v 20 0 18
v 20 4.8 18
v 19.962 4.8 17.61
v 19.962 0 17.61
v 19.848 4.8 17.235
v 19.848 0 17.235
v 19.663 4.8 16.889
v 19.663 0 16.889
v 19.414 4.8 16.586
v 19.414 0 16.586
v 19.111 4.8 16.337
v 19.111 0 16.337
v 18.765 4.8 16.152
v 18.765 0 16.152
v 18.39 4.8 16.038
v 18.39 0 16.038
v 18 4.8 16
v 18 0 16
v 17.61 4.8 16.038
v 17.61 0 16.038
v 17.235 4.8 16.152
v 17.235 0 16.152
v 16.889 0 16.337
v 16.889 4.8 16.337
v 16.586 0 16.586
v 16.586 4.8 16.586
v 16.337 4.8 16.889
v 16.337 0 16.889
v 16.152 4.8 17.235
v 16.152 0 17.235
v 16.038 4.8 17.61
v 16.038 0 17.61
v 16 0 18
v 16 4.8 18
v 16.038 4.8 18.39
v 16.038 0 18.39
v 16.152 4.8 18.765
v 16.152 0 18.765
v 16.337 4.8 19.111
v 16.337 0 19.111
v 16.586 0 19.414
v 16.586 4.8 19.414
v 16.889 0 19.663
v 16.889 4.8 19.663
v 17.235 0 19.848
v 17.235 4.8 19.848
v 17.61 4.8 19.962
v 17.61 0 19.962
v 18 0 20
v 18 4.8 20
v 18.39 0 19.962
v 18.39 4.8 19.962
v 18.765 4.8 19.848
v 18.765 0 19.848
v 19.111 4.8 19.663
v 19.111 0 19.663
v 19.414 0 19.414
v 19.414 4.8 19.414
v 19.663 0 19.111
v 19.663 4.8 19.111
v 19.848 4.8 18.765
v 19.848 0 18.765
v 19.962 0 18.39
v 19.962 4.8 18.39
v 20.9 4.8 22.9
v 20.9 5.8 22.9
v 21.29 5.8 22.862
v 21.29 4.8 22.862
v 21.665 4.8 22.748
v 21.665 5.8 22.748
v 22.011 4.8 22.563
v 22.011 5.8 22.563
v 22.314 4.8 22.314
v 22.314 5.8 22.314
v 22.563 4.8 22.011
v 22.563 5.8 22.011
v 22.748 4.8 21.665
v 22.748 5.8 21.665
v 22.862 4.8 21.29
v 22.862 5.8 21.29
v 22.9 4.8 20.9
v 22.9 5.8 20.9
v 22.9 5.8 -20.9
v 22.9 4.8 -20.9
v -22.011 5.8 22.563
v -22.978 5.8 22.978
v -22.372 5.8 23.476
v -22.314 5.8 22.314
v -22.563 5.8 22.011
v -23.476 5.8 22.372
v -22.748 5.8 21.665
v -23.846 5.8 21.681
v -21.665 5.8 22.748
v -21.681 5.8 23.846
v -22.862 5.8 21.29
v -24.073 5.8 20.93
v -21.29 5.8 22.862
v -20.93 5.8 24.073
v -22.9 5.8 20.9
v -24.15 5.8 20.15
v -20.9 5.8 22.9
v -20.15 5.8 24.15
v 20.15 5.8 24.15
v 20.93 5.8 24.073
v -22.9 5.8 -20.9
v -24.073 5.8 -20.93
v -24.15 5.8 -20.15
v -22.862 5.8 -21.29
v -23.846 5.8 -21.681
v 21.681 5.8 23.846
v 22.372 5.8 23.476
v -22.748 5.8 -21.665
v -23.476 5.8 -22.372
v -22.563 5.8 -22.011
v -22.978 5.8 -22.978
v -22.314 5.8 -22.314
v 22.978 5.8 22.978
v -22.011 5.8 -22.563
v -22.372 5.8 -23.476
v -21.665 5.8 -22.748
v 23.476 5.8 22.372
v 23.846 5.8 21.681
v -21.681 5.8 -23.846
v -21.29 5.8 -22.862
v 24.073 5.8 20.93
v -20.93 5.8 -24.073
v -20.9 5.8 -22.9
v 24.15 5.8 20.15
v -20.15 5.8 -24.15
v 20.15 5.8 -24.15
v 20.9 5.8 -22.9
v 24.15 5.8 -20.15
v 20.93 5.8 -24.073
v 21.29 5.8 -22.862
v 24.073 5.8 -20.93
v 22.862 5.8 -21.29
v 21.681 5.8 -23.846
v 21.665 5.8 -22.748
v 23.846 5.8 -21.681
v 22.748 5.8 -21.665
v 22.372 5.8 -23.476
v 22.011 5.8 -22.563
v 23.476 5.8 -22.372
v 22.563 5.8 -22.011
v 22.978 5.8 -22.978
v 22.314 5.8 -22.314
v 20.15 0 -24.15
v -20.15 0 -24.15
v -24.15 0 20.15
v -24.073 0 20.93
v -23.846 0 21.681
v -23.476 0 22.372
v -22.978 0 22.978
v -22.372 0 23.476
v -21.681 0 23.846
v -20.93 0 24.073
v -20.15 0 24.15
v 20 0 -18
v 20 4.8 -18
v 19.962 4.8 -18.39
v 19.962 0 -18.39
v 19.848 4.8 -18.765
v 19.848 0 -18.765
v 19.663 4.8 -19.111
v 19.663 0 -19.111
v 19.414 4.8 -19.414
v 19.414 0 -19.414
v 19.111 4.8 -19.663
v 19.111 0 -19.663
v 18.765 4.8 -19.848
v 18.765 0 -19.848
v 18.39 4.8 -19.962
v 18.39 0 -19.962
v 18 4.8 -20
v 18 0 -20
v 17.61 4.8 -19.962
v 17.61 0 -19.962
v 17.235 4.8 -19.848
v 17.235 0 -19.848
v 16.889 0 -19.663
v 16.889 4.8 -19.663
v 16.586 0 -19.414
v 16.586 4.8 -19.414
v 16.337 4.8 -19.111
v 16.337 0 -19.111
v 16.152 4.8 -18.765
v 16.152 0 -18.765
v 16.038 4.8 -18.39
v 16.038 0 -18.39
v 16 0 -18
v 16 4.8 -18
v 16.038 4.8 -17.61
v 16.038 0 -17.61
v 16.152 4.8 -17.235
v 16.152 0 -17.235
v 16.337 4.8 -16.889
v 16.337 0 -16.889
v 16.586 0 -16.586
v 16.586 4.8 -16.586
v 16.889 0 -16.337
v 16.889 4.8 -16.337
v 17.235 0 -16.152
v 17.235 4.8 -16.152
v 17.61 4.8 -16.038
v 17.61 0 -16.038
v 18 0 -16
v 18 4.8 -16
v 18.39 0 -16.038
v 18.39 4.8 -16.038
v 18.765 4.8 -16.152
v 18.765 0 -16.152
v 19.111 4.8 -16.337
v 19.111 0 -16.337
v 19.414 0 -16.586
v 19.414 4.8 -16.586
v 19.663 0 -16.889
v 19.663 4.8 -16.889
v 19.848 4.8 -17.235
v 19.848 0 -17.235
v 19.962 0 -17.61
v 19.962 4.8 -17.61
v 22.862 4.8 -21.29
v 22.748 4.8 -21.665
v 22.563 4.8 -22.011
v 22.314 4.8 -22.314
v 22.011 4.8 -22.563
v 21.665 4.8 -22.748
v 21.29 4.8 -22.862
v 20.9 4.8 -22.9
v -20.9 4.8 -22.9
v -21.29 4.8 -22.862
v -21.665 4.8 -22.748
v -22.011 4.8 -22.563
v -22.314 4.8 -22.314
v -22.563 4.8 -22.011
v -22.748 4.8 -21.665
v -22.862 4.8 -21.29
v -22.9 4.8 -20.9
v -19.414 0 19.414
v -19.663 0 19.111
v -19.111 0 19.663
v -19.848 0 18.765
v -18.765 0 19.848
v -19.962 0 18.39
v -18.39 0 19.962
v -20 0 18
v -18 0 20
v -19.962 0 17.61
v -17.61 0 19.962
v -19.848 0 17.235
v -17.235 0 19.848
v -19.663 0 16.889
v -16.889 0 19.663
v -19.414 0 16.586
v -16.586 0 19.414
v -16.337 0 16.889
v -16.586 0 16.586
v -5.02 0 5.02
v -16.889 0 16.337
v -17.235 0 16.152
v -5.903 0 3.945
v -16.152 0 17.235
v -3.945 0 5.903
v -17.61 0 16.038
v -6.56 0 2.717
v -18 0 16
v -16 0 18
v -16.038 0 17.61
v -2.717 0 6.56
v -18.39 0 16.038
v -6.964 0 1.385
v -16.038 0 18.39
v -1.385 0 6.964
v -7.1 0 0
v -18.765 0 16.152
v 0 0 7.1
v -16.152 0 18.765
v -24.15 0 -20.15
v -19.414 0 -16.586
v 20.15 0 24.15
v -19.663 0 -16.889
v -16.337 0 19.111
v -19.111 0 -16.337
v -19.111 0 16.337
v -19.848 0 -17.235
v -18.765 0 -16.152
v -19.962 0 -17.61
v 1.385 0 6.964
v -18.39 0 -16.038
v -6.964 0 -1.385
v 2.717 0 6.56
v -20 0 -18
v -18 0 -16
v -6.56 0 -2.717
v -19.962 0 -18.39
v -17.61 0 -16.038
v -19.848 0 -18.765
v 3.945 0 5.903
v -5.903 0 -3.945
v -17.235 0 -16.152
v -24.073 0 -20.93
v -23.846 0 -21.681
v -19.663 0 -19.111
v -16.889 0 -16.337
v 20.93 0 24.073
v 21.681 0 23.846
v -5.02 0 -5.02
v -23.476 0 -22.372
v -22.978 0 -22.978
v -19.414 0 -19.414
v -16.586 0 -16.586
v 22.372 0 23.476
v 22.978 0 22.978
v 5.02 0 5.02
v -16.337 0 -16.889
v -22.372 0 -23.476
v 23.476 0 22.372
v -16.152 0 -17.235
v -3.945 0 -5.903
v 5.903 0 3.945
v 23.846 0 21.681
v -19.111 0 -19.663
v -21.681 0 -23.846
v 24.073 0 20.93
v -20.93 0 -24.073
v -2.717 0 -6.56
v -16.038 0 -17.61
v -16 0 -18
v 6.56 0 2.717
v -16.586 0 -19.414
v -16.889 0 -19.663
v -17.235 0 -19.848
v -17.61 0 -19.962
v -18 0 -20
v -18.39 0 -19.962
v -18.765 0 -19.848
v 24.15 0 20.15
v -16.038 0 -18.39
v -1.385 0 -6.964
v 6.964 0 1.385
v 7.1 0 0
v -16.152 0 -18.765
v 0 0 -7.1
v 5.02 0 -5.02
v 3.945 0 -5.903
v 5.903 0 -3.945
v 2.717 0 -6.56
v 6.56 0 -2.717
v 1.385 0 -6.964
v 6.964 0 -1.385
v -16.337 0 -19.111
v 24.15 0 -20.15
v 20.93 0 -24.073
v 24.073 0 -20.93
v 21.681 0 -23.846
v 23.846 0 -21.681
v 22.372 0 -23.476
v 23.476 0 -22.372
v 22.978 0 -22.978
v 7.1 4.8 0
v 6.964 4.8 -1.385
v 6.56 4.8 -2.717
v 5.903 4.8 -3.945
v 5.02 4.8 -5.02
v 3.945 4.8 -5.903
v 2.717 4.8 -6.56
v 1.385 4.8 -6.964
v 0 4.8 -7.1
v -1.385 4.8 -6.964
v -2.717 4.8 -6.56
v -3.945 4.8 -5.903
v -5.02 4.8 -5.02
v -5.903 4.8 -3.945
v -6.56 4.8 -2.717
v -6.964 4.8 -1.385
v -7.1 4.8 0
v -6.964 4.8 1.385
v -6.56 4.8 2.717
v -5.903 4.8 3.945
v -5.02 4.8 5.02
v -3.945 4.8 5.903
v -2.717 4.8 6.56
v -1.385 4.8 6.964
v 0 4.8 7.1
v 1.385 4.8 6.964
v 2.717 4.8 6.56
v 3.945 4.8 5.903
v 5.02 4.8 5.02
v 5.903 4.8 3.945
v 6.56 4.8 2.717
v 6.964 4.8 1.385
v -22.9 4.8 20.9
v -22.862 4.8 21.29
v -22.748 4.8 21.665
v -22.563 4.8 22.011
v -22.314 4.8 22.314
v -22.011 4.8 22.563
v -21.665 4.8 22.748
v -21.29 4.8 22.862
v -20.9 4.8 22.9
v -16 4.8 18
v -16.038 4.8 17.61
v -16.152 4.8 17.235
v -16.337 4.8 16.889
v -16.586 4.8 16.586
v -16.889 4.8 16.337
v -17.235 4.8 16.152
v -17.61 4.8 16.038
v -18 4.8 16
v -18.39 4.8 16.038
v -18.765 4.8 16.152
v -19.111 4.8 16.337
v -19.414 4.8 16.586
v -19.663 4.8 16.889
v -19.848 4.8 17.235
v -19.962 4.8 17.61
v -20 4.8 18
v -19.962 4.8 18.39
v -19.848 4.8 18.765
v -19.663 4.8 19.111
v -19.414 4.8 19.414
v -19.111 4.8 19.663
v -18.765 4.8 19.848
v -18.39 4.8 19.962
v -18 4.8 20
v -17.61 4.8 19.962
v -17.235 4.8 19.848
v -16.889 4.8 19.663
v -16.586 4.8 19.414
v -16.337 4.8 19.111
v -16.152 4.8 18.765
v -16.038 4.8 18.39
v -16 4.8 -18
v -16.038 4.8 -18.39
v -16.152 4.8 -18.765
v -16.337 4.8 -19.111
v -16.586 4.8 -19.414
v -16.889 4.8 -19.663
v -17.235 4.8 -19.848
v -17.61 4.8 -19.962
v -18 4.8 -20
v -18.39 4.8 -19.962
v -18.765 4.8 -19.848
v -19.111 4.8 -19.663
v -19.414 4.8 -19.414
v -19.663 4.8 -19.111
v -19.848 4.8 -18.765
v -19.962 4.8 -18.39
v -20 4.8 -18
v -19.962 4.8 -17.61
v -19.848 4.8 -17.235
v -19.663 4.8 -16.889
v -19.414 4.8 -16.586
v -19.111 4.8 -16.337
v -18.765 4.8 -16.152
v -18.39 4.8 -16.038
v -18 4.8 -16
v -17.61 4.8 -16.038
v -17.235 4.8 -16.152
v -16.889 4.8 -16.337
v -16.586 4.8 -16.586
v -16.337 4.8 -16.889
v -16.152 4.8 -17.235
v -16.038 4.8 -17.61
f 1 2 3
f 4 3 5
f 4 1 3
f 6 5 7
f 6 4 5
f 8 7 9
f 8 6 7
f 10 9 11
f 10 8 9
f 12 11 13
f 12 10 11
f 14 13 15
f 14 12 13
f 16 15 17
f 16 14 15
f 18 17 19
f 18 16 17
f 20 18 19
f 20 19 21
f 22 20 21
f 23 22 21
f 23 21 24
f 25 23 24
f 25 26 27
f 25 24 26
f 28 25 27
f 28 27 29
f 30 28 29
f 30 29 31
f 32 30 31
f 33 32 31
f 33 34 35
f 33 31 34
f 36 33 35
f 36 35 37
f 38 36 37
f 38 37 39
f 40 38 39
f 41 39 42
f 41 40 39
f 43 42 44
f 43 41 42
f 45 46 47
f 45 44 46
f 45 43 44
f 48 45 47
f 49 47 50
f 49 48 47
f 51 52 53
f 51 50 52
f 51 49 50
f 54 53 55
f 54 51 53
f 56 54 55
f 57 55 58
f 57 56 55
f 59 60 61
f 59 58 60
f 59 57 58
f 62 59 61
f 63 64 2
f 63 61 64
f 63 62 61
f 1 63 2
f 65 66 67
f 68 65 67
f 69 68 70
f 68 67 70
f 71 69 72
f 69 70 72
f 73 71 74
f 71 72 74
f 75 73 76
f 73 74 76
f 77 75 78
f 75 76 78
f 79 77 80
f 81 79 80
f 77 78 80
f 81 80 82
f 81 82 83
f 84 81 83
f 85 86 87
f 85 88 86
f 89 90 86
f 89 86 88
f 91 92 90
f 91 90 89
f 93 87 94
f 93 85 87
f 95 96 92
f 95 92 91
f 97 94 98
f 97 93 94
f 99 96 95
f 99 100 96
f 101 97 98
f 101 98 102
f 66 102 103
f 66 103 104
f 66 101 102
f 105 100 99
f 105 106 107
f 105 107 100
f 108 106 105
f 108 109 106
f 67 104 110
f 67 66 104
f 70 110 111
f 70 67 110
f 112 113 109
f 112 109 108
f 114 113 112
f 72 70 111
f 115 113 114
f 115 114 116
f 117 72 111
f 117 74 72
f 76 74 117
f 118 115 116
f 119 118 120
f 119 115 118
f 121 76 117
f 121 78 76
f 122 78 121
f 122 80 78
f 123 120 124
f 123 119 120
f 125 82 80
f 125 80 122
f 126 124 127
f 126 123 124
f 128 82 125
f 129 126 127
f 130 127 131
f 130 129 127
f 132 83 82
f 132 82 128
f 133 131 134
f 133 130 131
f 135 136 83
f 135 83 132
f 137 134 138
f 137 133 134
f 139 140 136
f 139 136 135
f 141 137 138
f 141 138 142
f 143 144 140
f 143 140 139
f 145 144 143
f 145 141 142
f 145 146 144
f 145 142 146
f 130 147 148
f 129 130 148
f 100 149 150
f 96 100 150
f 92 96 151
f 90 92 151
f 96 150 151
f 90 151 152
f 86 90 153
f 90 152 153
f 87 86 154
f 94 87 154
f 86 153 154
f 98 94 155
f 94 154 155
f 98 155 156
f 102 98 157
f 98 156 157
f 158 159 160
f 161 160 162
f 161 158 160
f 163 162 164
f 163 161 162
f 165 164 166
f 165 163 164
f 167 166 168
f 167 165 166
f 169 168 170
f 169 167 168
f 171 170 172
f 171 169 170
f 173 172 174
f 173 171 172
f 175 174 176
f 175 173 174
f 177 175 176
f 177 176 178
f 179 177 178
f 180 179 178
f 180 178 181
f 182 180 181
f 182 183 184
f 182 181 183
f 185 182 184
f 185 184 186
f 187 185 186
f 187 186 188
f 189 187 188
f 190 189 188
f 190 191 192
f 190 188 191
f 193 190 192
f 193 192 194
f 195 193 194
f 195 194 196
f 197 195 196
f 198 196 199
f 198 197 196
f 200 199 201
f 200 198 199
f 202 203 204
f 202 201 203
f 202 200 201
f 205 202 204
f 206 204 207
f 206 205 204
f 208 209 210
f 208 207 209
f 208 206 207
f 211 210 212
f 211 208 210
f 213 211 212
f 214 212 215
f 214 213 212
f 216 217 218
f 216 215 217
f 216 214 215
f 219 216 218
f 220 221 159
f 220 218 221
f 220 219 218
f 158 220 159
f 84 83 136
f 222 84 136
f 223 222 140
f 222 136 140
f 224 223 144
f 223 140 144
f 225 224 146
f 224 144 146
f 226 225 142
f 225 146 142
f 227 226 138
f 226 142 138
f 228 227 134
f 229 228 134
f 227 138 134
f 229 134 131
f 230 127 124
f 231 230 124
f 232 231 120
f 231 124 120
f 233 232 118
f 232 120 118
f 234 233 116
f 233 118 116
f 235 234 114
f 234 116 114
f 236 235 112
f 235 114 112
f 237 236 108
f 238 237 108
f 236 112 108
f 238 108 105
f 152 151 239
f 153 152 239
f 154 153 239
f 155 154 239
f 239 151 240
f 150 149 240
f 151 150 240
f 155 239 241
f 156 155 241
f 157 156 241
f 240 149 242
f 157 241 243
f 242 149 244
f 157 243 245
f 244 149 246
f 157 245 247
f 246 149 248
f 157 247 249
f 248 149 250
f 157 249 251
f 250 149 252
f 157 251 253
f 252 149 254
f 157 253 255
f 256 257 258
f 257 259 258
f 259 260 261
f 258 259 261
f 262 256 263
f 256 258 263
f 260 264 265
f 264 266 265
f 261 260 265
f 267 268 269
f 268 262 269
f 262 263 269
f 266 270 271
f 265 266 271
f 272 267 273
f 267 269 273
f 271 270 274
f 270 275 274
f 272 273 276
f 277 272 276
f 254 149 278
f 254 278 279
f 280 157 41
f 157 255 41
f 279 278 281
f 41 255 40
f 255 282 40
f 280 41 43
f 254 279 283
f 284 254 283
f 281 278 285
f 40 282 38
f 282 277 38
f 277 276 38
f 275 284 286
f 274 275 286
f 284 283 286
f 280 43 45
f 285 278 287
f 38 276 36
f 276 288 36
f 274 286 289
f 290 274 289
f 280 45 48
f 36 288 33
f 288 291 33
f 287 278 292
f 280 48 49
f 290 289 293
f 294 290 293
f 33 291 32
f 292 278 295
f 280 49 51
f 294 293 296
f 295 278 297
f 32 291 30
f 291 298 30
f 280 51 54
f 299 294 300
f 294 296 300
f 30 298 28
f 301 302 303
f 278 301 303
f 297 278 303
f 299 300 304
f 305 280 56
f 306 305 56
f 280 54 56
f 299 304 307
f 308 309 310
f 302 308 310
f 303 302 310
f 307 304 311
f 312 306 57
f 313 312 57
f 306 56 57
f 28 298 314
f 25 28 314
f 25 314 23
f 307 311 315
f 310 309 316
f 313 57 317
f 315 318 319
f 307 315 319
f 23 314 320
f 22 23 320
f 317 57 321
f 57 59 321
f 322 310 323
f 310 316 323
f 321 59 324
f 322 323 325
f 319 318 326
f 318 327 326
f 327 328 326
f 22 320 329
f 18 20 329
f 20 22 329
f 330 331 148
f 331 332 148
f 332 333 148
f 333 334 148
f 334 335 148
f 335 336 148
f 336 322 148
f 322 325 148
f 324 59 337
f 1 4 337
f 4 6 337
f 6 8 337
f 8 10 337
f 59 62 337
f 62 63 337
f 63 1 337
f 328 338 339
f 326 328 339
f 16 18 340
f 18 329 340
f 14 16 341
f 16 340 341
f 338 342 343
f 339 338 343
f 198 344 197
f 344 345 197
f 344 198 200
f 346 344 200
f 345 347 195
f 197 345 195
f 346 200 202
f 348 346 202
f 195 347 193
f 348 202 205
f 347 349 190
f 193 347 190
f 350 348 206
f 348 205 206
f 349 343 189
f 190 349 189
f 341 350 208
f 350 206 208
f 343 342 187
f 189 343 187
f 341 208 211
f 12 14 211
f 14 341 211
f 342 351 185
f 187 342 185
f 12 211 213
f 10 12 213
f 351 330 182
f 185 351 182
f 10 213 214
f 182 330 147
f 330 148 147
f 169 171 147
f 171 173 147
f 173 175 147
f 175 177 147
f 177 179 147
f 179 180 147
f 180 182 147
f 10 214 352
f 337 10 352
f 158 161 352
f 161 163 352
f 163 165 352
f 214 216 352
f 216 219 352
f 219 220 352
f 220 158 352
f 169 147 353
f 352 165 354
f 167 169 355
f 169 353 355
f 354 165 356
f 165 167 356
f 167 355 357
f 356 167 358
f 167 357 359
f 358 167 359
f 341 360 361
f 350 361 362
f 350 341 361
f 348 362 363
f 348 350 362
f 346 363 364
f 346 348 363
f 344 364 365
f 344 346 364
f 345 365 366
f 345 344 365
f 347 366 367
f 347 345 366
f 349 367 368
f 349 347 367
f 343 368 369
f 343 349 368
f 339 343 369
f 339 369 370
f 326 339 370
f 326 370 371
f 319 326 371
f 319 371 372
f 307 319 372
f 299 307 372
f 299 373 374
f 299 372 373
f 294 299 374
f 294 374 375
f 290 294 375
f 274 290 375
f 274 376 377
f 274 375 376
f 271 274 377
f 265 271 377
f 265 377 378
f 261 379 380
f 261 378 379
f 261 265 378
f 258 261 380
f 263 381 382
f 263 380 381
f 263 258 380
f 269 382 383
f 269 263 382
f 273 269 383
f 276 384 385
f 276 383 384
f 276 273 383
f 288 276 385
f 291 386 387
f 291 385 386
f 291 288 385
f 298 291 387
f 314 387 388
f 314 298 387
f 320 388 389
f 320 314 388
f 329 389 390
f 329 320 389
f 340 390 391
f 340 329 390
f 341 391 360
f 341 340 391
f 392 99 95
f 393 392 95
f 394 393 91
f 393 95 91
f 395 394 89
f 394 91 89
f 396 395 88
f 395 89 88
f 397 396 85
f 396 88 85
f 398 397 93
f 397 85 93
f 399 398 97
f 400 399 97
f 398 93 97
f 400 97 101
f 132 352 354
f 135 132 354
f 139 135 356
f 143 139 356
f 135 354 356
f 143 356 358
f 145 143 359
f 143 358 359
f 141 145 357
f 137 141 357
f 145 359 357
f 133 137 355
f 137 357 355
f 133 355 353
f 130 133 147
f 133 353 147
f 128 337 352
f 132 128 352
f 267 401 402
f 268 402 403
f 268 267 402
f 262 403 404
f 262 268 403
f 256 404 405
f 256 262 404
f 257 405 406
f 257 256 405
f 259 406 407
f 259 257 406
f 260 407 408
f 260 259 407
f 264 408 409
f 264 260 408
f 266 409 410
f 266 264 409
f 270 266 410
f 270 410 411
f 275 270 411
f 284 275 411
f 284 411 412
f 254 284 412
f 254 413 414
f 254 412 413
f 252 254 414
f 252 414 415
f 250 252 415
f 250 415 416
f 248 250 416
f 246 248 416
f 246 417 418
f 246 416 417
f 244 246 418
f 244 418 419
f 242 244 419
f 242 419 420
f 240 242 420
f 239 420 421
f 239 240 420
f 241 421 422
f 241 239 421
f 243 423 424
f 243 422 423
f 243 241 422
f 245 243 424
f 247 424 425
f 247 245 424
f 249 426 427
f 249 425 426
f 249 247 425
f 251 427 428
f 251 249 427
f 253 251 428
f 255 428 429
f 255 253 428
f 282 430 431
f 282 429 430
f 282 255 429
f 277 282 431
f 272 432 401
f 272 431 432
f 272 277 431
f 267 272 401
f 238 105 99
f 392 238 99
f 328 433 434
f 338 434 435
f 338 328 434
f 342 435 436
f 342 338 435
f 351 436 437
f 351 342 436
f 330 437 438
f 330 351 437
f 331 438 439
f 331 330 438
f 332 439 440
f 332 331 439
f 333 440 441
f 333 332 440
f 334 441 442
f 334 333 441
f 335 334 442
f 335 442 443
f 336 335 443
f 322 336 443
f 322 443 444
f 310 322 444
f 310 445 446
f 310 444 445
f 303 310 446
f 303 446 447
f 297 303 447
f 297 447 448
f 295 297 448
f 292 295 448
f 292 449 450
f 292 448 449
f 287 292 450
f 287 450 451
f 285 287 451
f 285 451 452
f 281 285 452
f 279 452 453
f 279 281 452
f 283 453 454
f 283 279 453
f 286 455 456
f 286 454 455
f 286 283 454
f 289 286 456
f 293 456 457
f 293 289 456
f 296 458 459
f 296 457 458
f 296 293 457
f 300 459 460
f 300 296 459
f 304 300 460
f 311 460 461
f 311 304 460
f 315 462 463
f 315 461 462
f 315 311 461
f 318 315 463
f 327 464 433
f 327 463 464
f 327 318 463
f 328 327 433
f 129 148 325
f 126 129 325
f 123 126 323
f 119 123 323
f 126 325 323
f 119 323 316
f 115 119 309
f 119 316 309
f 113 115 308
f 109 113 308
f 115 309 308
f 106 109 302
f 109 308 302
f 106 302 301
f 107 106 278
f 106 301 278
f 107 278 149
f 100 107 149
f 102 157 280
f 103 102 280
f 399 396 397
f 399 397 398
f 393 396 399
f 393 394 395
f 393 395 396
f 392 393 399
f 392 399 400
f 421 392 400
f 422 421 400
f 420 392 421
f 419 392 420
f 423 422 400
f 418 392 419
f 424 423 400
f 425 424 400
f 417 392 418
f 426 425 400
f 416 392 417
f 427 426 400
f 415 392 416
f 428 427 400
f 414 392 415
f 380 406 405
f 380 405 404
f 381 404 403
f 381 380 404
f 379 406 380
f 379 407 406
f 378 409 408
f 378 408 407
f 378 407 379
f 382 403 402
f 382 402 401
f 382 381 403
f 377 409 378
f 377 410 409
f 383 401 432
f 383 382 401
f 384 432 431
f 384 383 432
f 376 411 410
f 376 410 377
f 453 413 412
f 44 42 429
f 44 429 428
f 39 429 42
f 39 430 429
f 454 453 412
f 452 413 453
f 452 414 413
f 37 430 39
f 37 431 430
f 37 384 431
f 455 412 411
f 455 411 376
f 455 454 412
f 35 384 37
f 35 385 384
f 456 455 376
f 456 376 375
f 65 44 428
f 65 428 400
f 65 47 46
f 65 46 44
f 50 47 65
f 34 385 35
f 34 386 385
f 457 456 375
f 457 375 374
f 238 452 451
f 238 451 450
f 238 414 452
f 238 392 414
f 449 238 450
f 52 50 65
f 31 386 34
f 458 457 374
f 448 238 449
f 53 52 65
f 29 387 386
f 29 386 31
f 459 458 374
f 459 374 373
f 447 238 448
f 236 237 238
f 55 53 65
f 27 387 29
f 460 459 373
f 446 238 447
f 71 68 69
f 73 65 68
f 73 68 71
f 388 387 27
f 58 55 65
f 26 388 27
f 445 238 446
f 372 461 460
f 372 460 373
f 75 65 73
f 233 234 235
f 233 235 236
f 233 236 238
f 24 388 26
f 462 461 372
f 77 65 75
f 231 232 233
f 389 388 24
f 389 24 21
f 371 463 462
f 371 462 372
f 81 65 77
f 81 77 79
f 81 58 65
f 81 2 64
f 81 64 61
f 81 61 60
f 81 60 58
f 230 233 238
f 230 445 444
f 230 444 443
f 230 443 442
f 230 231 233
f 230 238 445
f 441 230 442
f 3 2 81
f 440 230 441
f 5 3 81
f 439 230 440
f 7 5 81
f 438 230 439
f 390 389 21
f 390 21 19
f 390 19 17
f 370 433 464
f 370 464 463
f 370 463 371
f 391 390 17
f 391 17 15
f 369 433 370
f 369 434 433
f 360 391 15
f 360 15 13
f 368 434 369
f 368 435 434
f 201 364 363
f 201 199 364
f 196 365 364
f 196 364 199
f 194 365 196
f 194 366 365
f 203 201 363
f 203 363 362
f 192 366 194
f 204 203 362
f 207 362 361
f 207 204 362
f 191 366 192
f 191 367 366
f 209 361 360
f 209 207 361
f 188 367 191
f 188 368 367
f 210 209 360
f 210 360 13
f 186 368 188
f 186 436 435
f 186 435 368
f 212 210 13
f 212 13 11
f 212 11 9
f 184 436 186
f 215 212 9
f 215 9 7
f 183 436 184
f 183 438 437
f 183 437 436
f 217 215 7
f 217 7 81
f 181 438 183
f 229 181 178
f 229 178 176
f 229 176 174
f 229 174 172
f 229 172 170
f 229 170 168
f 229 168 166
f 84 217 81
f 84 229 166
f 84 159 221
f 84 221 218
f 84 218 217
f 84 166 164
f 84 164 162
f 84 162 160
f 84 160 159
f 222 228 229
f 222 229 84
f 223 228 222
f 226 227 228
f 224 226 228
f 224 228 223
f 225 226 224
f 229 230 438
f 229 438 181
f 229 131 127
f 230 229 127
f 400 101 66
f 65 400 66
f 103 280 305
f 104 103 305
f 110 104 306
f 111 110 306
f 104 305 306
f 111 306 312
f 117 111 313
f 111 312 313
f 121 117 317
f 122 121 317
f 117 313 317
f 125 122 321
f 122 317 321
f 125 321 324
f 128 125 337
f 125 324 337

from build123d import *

# Parameters (mm, degrees)
IZIM1_R                     = 7.1
IZIM1_R_2                   = 2
Y_KSEKLIK_EKSTR_ZYON1_DEPTH = 5.8
KES_EKSTR_ZYON1_DEPTH       = 1


with BuildPart() as part:
    # Çizim1 → Yükseklik-Ekstrüzyon1 (new body)
    with BuildSketch(Plane(origin=(0, 0, 0), x_dir=(1, 0, 0), z_dir=(0, 1, 0))):
        with BuildLine():
            Line((-20.15, -24.15), (20.15, -24.15))
            ThreePointArc((20.15, -24.15), (22.978427125, -22.978427125), (24.15, -20.15))
            Line((24.15, -20.15), (24.15, 20.15))
            ThreePointArc((24.15, 20.15), (22.978427125, 22.978427125), (20.15, 24.15))
            Line((20.15, 24.15), (-20.15, 24.15))
            ThreePointArc((-20.15, 24.15), (-22.978427125, 22.978427125), (-24.15, 20.15))
            Line((-24.15, 20.15), (-24.15, -20.15))
            ThreePointArc((-24.15, -20.15), (-22.978427125, -22.978427125), (-20.15, -24.15))
        make_face()
        Circle(IZIM1_R, mode=Mode.SUBTRACT)
        with Locations((-18, 18)):
            Circle(IZIM1_R_2, mode=Mode.SUBTRACT)
        with Locations((-18, -18)):
            Circle(IZIM1_R_2, mode=Mode.SUBTRACT)
        with Locations((18, -18)):
            Circle(IZIM1_R_2, mode=Mode.SUBTRACT)
        with Locations((18, 18)):
            Circle(IZIM1_R_2, mode=Mode.SUBTRACT)
    extrude(amount=Y_KSEKLIK_EKSTR_ZYON1_DEPTH)

    # Çizim2 → Kes-Ekstrüzyon1 (cut)
    with BuildSketch(Plane(origin=(0, 5.8, 0), x_dir=(1, 0, 0), z_dir=(0, 1, 0))):
        with BuildLine():
            Line((-20.9, -22.9), (20.9, -22.9))
            ThreePointArc((20.9, -22.9), (22.314213562, -22.314213562), (22.9, -20.9))
            Line((22.9, -20.9), (22.9, 20.9))
            ThreePointArc((22.9, 20.9), (22.314213562, 22.314213562), (20.9, 22.9))
            Line((20.9, 22.9), (-20.9, 22.9))
            ThreePointArc((-20.9, 22.9), (-22.314213562, 22.314213562), (-22.9, 20.9))
            Line((-22.9, 20.9), (-22.9, -20.9))
            ThreePointArc((-22.9, -20.9), (-22.314213562, -22.314213562), (-20.9, -22.9))
        make_face()
    extrude(amount=-KES_EKSTR_ZYON1_DEPTH, mode=Mode.SUBTRACT)


solid = part.part
